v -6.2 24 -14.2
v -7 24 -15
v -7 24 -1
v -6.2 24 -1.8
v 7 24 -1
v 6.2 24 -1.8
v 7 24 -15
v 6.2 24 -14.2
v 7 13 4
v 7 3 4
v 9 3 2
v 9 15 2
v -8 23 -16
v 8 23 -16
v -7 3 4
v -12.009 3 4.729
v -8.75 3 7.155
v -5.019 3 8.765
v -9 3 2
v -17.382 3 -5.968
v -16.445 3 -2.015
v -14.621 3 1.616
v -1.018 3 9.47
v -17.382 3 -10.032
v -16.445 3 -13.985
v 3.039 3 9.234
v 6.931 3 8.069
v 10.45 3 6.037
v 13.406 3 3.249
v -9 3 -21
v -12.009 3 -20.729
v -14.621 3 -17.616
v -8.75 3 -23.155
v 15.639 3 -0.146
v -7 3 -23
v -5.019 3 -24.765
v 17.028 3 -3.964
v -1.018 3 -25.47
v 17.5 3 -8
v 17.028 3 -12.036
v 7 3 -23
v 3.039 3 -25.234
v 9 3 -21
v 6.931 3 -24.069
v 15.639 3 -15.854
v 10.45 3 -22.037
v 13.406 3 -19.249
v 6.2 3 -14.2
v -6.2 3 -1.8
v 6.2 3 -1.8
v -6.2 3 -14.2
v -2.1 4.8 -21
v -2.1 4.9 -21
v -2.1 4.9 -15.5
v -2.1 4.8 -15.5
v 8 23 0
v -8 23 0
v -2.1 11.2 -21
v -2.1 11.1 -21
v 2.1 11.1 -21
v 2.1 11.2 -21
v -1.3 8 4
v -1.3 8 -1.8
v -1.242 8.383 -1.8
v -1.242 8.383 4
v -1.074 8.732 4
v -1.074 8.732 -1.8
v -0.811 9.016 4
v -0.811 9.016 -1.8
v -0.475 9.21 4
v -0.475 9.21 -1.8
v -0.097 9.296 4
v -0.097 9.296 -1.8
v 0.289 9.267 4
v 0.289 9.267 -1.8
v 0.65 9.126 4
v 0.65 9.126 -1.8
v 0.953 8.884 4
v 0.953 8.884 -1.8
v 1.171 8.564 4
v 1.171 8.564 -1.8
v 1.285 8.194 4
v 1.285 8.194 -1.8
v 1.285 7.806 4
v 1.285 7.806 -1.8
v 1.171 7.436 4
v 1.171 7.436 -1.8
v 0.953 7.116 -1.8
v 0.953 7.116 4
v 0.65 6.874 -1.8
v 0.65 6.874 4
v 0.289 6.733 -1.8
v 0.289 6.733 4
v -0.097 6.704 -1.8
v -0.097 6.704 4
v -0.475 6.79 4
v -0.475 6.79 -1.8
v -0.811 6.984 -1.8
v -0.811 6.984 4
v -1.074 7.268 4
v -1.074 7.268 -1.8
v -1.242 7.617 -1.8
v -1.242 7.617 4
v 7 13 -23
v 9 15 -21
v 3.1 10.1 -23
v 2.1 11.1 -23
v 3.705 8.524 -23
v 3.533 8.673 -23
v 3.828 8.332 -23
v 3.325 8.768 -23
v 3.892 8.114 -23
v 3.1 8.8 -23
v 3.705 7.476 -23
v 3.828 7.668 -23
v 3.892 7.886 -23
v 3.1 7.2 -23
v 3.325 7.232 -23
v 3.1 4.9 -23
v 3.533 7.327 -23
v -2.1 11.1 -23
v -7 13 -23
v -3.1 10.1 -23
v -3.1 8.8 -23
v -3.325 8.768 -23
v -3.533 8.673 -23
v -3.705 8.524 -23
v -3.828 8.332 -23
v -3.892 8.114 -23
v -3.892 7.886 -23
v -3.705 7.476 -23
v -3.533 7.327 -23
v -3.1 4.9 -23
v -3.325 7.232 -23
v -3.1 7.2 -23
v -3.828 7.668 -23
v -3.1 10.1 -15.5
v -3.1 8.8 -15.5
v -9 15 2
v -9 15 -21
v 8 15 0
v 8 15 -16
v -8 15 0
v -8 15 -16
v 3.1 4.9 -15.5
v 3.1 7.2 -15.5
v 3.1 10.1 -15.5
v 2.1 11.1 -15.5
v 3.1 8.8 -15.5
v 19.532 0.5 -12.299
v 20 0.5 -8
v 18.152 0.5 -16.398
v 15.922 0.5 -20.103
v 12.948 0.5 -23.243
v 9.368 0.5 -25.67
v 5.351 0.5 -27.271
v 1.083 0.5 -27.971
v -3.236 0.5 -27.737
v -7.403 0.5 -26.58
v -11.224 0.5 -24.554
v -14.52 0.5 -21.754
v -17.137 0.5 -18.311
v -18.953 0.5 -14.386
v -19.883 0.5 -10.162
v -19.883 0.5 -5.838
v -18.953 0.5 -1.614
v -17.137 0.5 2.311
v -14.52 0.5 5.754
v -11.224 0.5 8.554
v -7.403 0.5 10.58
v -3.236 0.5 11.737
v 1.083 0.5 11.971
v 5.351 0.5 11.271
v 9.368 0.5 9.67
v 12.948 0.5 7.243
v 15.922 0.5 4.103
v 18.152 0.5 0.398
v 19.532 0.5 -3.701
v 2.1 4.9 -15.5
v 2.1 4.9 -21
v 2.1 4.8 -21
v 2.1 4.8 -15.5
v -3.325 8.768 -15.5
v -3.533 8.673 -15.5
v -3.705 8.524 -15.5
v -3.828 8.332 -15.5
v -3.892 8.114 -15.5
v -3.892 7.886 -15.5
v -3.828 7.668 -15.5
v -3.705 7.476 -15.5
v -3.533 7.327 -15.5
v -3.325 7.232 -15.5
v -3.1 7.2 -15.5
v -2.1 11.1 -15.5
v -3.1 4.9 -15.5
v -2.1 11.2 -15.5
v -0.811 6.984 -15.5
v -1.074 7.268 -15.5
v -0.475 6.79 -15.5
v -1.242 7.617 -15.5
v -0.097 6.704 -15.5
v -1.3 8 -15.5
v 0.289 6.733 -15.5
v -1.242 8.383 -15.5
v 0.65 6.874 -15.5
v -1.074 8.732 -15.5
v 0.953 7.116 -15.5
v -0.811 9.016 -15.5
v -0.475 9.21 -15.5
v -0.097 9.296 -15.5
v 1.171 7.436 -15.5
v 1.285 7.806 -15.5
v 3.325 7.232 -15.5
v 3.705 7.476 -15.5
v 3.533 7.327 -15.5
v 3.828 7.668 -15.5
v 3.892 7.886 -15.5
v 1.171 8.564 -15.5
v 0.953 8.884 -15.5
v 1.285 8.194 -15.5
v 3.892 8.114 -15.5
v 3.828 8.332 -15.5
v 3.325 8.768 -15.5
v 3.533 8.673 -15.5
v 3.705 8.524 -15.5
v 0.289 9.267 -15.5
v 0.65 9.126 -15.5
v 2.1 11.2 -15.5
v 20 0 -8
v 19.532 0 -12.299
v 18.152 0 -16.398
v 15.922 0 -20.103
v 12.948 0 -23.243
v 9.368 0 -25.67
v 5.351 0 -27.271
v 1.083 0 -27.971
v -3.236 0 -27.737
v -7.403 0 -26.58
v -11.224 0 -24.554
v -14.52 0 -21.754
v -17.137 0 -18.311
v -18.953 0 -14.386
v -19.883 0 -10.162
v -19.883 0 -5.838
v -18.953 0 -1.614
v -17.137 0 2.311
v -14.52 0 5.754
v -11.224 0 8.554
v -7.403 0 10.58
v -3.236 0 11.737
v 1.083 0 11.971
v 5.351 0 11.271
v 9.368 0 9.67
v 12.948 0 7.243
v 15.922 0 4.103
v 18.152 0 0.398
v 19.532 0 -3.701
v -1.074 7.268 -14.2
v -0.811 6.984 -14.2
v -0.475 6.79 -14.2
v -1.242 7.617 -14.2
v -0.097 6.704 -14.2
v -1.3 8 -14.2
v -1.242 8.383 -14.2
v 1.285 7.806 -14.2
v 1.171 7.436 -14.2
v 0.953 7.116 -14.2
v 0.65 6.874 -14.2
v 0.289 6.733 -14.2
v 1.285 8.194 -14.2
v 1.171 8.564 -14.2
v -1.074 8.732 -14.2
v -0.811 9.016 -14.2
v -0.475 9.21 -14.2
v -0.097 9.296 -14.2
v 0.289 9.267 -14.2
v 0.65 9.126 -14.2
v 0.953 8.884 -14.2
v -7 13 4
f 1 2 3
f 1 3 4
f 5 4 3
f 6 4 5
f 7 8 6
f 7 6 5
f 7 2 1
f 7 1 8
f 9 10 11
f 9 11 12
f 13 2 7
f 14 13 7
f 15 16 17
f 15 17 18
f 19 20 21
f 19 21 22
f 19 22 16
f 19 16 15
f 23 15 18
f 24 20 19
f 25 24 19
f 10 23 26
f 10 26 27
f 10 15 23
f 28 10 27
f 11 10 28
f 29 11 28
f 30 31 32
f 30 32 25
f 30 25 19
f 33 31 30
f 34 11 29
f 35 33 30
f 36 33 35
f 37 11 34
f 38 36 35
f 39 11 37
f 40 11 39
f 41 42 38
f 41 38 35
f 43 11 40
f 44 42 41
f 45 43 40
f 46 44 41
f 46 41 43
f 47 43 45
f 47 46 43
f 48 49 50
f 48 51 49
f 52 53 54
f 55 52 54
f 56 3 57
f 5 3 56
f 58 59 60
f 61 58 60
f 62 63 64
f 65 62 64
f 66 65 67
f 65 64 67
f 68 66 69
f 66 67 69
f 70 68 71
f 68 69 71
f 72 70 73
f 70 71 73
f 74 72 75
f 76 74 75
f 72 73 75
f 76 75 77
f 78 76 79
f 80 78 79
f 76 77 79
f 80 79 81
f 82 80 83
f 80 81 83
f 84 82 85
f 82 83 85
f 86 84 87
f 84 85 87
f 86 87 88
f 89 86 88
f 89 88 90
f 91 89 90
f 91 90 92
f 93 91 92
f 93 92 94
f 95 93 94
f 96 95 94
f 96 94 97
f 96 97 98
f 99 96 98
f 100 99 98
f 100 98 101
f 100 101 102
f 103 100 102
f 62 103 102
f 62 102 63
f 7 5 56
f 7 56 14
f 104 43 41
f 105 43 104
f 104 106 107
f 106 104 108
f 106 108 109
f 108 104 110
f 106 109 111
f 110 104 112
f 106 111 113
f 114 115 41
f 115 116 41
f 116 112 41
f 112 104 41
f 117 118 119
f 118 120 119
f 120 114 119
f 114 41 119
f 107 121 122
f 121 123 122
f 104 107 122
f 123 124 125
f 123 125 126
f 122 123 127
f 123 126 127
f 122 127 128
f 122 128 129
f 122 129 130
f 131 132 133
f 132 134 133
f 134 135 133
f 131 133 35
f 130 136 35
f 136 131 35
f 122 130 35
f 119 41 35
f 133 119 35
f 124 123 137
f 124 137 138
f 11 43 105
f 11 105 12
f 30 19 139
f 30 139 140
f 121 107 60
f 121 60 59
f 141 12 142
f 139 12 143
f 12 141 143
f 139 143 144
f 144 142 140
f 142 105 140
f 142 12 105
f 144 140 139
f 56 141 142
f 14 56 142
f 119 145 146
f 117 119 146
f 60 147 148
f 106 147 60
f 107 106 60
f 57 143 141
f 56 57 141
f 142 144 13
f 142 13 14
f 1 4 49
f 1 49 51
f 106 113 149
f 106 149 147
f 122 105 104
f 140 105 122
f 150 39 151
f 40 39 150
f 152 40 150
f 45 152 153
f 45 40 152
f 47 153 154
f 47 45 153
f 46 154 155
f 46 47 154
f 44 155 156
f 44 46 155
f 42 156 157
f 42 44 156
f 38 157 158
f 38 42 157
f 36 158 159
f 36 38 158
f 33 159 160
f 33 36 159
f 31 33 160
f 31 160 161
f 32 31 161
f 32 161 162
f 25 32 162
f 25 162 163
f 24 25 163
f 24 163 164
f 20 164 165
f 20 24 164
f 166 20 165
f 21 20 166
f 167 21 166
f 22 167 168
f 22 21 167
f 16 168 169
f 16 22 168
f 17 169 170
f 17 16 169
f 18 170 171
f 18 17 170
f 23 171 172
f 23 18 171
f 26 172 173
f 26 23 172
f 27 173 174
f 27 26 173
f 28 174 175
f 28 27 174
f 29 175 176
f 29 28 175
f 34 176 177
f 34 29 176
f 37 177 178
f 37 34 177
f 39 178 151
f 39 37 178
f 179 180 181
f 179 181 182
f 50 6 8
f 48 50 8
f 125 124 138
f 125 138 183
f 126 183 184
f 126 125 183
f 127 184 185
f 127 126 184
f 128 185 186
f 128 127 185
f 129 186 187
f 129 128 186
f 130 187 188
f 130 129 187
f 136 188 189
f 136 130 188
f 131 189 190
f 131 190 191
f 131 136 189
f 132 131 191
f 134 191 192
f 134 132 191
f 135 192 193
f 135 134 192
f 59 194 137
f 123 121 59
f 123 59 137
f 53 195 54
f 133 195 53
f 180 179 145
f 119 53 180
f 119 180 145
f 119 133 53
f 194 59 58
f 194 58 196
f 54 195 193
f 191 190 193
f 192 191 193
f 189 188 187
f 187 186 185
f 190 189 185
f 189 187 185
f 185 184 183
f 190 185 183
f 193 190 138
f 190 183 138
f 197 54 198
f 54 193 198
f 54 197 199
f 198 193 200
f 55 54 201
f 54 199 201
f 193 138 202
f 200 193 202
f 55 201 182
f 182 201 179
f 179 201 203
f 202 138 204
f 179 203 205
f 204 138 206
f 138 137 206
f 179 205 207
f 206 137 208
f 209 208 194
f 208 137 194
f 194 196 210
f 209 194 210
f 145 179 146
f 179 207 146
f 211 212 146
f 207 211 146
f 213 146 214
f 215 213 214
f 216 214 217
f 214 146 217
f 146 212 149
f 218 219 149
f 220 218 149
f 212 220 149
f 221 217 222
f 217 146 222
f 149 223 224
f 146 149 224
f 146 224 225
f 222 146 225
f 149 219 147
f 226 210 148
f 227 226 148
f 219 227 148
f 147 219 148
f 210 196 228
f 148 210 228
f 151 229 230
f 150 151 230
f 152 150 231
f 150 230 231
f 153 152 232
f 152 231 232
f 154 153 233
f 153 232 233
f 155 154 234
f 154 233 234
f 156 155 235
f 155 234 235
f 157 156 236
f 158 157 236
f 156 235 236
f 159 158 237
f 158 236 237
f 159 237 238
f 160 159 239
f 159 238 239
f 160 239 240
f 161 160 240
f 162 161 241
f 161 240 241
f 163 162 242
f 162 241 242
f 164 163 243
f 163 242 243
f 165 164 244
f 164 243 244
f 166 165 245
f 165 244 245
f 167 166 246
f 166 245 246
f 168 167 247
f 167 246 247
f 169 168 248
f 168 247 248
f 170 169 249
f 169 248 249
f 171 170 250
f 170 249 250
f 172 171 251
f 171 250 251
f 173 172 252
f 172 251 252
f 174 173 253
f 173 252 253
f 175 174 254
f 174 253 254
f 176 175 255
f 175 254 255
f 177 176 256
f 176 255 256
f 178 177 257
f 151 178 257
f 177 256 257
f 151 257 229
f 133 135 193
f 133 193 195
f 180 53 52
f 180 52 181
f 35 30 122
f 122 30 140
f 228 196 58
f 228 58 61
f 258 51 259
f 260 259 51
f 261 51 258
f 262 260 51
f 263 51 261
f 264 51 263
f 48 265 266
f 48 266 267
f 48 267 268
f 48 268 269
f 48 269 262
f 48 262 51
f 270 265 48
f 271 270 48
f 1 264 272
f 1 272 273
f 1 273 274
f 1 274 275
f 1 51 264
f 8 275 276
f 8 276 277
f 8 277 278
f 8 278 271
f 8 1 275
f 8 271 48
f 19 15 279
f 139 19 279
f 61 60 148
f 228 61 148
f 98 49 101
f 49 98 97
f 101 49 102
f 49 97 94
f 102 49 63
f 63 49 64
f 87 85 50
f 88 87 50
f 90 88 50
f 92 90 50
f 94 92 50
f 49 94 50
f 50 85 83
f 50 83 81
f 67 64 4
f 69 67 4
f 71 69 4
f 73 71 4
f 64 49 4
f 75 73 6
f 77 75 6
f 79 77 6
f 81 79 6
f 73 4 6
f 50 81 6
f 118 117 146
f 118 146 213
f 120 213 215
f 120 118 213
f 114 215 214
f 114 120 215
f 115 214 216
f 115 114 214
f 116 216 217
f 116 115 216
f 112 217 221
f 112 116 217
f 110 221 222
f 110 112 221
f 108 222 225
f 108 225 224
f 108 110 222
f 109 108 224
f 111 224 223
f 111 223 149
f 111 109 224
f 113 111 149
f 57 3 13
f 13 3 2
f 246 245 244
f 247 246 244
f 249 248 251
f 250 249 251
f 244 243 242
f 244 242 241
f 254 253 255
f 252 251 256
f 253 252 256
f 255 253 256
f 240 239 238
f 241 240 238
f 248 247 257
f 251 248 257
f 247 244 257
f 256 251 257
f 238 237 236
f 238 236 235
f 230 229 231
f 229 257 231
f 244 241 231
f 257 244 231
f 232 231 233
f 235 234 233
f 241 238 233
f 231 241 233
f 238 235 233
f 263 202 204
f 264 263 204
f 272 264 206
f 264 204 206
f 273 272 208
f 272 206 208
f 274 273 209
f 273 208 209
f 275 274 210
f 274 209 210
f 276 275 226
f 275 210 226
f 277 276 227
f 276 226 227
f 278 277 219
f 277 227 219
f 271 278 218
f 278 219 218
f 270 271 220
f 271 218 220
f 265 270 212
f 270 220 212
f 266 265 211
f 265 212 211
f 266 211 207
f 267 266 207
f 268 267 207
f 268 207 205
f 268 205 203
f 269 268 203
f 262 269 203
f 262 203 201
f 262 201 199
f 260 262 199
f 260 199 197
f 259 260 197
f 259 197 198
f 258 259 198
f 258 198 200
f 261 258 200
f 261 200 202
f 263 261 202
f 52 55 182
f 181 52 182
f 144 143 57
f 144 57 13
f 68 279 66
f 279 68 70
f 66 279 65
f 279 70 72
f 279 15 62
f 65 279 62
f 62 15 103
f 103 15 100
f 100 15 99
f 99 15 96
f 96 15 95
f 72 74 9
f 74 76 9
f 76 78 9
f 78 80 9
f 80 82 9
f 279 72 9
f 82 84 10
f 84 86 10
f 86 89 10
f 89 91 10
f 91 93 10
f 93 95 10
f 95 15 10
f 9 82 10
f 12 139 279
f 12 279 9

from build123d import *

# Parameters (mm, degrees)
SKETCH1_W               = 16
SKETCH1_H               = 16
BOSS_EXTRUDE1_DEPTH     = 24
SKETCH12_W              = 12.4
SKETCH12_H              = 12.4
CUT_EXTRUDE6_DEPTH      = 22
SKETCH13_R              = 20
BOSS_EXTRUDE2_DEPTH     = 3
CHAMFER1_SIZE           = 2.5
SKETCH14_W              = 16
SKETCH14_H              = 16
BOSS_EXTRUDE3_DEPTH     = 12
CUT_EXTRUDE1_DEPTH      = 7.5
SKETCH11_W              = 4.2
SKETCH11_H              = 5.5
CUT_EXTRUDE5_DEPTH      = 6.3
CUT_EXTRUDE5_DEPTH_BACK = 0.1
CHAMFER2_SIZE           = 2
CHAMFER4_SIZE           = 2
SKETCH15_R              = 1.3
CUT_EXTRUDE7_DEPTH      = 28.5
CHAMFER5_SIZE           = 1


with BuildPart() as part:
    # Sketch1 → Boss-Extrude1 (new body)
    with BuildSketch(Plane(origin=(0, 0, 0), x_dir=(1, 0, 0), z_dir=(0, 1, 0))):
        with Locations((0, 8)):
            Rectangle(SKETCH1_W, SKETCH1_H)
    extrude(amount=BOSS_EXTRUDE1_DEPTH)

    # Sketch12 → Cut-Extrude6 (cut)
    with BuildSketch(Plane(origin=(0, 24, 0), x_dir=(1, 0, 0), z_dir=(0, 1, 0))):
        with Locations((0, 8)):
            Rectangle(SKETCH12_W, SKETCH12_H)
    extrude(amount=-CUT_EXTRUDE6_DEPTH, mode=Mode.SUBTRACT)

    # Sketch13 → Boss-Extrude2 (add)
    with BuildSketch(Plane(origin=(0, 0, 0), x_dir=(1, 0, 0), z_dir=(0, 1, 0))):
        with Locations((0, 8)):
            Circle(SKETCH13_R)
    extrude(amount=BOSS_EXTRUDE2_DEPTH)

    # Chamfer1
    chamfer1_edges = [part.edges().sort_by_distance(p)[0] for p in [
        (-20, 3, -8),
    ]]
    chamfer(chamfer1_edges, length=CHAMFER1_SIZE)

    # Sketch14 → Boss-Extrude3 (add)
    with BuildSketch(Plane(origin=(0, 3, 0), x_dir=(1, 0, 0), z_dir=(0, 1, 0))):
        Polygon((-8, 23), (8, 23), (9, 23), (9, -4), (8, -4), (-8, -4), (-9, -4), (-9, 23), align=None)
        with Locations((0, 8)):
            Rectangle(SKETCH14_W, SKETCH14_H, mode=Mode.SUBTRACT)
    extrude(amount=BOSS_EXTRUDE3_DEPTH)

    # Sketch5 → Cut-Extrude1 (cut)
    with BuildSketch(Plane(origin=(0, 0, -23), x_dir=(-1, 0, 0), z_dir=(0, 0, -1))):
        with BuildLine():
            Line((-2.1, 11.1), (2.1, 11.1))
            Line((2.1, 11.1), (3.1, 10.1))
            Line((3.1, 10.1), (3.1, 8.8))
            ThreePointArc((3.1, 8.8), (3.9, 8), (3.1, 7.2))
            Line((3.1, 7.2), (3.1, 4.9))
            Line((3.1, 4.9), (-3.1, 4.9))
            Line((-3.1, 4.9), (-3.1, 7.2))
            ThreePointArc((-3.1, 7.2), (-3.9, 8), (-3.1, 8.8))
            Line((-3.1, 8.8), (-3.1, 10.1))
            Line((-3.1, 10.1), (-2.1, 11.1))
        make_face()
    extrude(amount=-CUT_EXTRUDE1_DEPTH, mode=Mode.SUBTRACT)

    # Sketch11 → Cut-Extrude5 (cut, two sides)
    with BuildSketch(Plane.XZ.offset(-11.1)) as cut_extrude5_sk:
        with Locations((0, -18.25)):
            Rectangle(SKETCH11_W, SKETCH11_H)
    extrude(amount=CUT_EXTRUDE5_DEPTH, mode=Mode.SUBTRACT)
    extrude(cut_extrude5_sk.sketch, amount=-CUT_EXTRUDE5_DEPTH_BACK, mode=Mode.SUBTRACT)

    # Chamfer2
    chamfer2_edges = [part.edges().sort_by_distance(p)[0] for p in [
        (0, 15, -23),
        (9, 9, -23),
        (-9, 9, -23),
    ]]
    chamfer(chamfer2_edges, length=CHAMFER2_SIZE)

    # Chamfer4
    chamfer4_edges = [part.edges().sort_by_distance(p)[0] for p in [
        (0, 15, 4),
        (-9, 9, 4),
        (9, 9, 4),
    ]]
    chamfer(chamfer4_edges, length=CHAMFER4_SIZE)

    # Sketch15 → Cut-Extrude7 (cut, through all)
    with BuildSketch(Plane(origin=(0, 0, -15.5), x_dir=(-1, 0, 0), z_dir=(0, 0, -1))):
        with Locations((0, 8)):
            Circle(SKETCH15_R)
    extrude(amount=-CUT_EXTRUDE7_DEPTH, mode=Mode.SUBTRACT)

    # Chamfer5
    chamfer5_edges = [part.edges().sort_by_distance(p)[0] for p in [
        (0, 24, -16),
        (-8, 24, -8),
        (0, 24, 0),
        (8, 24, -8),
    ]]
    chamfer(chamfer5_edges, length=CHAMFER5_SIZE)


solid = part.part
